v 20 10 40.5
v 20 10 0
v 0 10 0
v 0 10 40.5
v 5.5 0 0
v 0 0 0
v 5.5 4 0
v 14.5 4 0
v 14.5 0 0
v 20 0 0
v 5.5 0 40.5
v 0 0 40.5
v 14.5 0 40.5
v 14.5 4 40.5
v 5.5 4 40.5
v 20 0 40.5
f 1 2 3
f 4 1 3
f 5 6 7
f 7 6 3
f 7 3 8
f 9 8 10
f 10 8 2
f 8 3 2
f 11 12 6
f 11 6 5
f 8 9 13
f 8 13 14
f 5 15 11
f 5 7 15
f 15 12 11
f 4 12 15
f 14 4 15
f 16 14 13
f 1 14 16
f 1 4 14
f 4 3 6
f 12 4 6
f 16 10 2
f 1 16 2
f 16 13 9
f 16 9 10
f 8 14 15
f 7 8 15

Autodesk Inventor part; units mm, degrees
ref_plane "YZ Plane" through (0, 0, 0) normal (1, 0, 0) x (0, 1, 0)
ref_plane "XZ Plane" through (0, 0, 0) normal (0, 1, 0) x (-1, 0, 0)
ref_plane "XY Plane" through (0, 0, 0) normal (0, 0, 1) x (1, 0, 0)
sketch "Sketch1" plane through (0, 0, 0) normal (0, 0, 1) x (1, 0, 0)
  line L0 (0, 0) -> (20, 0)
  line L1 (20, 0) -> (20, 10)
  line L2 (20, 10) -> (0, 10)
  line L3 (0, 10) -> (0, 0)
  line L4 (5.5, 0) -> (14.5, 0)
  line L5 (14.5, 0) -> (14.5, 4)
  line L6 (14.5, 4) -> (5.5, 4)
  line L7 (5.5, 4) -> (5.5, 0)
  point P0 (10, 4)
  point P1 (10, 10)
  dimension "d0" = 9
  dimension "d1" = 4
  dimension "d2" = 10
  dimension "d3" = 20
extrude "Extrusion1" add sketch "Sketch1" along normal blind 40.5 contours L3 L2 L1 L0 L5 L6 L7
properties part number "MGN9H"
